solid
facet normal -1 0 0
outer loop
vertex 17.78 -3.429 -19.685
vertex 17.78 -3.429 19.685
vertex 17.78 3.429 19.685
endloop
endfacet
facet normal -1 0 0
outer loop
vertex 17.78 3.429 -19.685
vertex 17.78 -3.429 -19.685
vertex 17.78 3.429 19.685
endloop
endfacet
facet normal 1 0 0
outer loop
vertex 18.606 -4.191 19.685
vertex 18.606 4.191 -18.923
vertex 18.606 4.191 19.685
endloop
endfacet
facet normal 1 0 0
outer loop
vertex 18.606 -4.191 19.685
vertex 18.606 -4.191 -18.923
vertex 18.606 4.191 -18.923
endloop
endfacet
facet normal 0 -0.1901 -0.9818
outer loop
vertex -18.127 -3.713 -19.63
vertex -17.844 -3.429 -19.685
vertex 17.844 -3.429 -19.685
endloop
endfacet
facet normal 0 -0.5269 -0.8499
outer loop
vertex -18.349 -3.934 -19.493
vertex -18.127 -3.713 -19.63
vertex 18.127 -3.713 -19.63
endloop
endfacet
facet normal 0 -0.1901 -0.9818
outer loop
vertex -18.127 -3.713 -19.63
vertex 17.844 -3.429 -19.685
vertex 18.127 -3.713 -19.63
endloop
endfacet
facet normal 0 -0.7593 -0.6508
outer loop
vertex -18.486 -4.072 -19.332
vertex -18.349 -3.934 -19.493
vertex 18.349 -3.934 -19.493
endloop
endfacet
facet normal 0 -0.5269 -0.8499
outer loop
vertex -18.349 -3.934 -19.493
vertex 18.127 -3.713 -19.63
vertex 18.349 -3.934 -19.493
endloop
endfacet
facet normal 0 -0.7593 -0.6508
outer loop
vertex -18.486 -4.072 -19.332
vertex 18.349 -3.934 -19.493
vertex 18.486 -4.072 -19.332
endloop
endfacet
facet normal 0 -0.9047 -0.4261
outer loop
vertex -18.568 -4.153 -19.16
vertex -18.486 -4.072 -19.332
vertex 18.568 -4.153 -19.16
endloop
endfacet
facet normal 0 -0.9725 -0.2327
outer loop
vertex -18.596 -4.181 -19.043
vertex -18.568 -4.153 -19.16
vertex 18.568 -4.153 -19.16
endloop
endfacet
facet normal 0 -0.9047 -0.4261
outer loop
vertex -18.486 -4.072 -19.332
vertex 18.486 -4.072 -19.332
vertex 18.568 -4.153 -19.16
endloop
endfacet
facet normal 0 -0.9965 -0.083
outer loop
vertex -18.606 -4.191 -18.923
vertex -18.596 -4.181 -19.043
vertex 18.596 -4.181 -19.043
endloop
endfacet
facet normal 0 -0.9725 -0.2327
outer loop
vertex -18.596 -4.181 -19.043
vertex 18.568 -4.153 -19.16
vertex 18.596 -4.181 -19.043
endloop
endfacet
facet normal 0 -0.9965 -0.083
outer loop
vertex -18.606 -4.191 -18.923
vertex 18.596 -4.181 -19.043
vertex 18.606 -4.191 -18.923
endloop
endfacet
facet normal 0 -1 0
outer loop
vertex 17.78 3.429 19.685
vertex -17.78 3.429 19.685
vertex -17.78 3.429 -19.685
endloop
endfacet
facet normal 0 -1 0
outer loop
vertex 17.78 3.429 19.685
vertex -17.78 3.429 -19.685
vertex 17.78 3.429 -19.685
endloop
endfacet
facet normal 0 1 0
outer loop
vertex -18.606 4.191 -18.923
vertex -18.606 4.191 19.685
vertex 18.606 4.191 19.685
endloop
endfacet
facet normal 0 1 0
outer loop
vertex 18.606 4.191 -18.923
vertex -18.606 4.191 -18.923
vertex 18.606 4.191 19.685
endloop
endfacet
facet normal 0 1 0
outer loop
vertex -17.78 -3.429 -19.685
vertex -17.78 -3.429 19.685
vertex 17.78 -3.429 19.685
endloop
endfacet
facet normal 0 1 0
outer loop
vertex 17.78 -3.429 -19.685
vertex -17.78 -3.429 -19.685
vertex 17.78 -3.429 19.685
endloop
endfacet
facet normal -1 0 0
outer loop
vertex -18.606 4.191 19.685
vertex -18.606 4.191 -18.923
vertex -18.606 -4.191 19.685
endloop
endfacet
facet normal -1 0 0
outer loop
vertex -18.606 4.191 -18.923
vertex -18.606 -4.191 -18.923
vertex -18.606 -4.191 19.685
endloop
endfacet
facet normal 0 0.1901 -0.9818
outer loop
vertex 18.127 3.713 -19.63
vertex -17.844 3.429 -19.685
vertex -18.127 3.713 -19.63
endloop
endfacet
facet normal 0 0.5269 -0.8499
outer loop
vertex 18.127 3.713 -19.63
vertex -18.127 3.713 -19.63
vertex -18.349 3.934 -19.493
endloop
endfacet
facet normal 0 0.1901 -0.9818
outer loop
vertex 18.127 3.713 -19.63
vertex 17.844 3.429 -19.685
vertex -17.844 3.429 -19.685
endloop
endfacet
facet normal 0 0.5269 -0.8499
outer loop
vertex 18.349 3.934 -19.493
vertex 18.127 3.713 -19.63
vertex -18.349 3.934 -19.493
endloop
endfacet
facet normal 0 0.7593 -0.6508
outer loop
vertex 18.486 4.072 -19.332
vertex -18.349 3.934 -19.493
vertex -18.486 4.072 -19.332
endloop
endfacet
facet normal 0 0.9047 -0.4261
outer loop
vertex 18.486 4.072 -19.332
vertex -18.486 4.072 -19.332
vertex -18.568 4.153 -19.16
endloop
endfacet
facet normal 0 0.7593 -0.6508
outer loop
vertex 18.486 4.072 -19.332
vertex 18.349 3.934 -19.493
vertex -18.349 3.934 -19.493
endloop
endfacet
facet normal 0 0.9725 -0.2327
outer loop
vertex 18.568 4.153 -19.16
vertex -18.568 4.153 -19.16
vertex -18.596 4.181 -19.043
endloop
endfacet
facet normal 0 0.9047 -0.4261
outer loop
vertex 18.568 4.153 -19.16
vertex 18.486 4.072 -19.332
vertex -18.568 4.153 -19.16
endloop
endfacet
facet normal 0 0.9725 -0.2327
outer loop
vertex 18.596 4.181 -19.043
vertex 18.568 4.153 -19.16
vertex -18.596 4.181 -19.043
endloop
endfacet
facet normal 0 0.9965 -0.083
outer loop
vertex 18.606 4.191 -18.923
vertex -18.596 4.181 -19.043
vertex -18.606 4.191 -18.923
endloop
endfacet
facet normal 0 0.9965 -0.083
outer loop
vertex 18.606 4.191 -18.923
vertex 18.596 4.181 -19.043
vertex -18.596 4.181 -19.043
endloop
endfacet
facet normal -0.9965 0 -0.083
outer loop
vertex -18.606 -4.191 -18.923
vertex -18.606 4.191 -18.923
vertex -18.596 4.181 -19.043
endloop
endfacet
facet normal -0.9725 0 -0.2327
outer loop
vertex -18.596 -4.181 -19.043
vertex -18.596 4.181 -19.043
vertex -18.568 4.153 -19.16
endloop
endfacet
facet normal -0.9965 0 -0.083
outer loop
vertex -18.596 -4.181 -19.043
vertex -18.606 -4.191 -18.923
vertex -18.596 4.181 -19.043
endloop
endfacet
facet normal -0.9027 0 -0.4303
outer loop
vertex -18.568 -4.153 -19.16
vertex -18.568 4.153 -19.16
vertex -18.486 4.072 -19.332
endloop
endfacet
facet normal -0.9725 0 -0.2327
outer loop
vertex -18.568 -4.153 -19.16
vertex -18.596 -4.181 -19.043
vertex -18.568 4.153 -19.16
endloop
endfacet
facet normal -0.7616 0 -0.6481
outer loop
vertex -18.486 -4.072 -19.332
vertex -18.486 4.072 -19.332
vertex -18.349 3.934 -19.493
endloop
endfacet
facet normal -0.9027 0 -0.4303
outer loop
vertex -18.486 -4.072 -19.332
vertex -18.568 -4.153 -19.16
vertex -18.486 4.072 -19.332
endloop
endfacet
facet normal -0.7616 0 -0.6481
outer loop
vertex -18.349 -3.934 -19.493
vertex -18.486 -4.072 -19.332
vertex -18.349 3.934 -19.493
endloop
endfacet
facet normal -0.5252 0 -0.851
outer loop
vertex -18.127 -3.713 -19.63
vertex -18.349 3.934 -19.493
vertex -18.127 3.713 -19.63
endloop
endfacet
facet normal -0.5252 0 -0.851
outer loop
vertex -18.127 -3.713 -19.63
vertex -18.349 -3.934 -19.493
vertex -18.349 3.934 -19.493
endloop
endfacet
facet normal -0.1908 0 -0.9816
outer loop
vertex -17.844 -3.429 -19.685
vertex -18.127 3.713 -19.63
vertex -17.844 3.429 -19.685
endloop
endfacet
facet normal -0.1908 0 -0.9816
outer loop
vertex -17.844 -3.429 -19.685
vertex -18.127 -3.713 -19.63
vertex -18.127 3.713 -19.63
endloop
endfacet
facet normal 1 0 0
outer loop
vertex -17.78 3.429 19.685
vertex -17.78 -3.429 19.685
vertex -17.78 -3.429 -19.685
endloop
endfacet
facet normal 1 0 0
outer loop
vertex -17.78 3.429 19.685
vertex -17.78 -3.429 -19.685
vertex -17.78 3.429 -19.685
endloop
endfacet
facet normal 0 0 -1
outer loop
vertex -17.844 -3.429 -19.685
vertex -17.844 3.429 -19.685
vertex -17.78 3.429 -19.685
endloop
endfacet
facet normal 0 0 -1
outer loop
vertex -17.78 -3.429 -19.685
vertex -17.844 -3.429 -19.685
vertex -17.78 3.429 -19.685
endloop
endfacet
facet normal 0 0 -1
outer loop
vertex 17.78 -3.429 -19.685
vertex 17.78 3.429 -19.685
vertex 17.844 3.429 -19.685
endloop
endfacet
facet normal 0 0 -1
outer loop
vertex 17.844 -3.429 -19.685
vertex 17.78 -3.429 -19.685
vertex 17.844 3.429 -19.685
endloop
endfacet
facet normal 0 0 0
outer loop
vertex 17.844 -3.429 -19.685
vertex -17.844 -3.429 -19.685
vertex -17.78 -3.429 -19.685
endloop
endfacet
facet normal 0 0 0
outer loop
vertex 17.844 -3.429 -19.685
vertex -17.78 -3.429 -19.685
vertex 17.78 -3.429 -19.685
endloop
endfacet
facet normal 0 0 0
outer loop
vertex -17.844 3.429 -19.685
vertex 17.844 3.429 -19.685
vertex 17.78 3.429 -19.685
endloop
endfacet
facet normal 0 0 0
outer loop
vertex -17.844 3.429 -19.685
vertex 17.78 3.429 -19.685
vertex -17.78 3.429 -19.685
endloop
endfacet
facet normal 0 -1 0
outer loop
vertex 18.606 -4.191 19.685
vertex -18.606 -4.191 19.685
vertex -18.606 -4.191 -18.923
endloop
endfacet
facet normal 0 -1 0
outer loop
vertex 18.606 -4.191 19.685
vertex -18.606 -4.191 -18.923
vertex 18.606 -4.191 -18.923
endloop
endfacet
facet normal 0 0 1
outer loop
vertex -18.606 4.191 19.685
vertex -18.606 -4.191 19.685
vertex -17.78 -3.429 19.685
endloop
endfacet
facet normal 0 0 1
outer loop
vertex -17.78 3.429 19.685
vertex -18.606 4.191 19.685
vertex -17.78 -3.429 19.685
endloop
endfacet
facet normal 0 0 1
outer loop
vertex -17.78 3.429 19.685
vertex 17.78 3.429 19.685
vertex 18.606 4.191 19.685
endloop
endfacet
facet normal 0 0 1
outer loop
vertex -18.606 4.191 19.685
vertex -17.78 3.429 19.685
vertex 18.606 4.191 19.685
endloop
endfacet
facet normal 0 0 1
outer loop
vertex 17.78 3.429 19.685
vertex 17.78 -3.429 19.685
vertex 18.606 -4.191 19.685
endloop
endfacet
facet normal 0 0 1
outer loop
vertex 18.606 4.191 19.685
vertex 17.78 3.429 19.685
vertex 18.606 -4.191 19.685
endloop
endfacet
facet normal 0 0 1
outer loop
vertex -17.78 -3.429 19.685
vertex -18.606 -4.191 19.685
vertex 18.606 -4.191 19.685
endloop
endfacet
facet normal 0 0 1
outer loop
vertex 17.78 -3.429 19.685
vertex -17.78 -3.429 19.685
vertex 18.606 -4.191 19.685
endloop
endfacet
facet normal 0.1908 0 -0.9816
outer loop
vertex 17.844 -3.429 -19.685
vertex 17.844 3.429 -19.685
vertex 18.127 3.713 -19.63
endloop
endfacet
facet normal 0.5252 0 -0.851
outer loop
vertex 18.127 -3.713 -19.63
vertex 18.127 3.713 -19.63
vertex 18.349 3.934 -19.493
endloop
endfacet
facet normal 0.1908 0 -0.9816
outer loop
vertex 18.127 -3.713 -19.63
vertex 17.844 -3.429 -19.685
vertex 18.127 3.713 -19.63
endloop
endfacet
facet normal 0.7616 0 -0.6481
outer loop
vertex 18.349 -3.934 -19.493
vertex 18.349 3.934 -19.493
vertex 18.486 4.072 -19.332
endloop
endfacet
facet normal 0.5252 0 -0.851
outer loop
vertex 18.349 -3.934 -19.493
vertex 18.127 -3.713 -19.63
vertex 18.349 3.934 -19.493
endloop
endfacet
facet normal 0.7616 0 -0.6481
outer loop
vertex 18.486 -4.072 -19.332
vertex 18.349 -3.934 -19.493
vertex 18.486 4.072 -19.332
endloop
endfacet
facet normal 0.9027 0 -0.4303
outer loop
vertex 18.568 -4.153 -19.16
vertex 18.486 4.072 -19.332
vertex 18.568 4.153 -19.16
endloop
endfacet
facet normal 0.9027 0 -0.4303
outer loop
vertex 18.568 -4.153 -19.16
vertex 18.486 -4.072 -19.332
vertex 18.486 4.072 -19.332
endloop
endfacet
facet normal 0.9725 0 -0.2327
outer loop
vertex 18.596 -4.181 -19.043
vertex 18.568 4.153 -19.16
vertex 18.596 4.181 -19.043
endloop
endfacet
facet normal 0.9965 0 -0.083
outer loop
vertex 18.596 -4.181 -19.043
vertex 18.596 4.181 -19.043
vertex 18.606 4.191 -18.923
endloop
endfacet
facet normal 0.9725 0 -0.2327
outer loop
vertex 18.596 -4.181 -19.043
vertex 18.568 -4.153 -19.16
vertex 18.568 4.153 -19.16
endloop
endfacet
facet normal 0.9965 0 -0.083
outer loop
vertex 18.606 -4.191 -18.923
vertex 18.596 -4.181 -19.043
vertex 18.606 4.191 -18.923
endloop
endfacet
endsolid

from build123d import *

# Parameters (mm, degrees)
F0_W     = 37.211
F0_H     = 39.37
F1_DEPTH = 4.191
F2_W     = 35.56
F2_H     = 6.858
F3_DEPTH = 39.37
F4_R     = 0.76199


# Not quite as in the source:
# - a fillet or chamfer is up to 0.001 mm smaller than in the source, because OpenCascade refuses the exact size


with BuildPart() as f1:
    # F0 (on Front) → F1 (new body, symmetric)
    with BuildSketch(Plane.XZ):
        Rectangle(F0_W, F0_H)
    extrude(amount=F1_DEPTH, both=True)

    # F2 (on face) → F3 (cut)
    with BuildSketch(Plane.XY.offset(19.685)):
        Rectangle(F2_W, F2_H)
    extrude(amount=-F3_DEPTH, mode=Mode.SUBTRACT)

    # F4 (radius 0.762 in the source; OpenCascade refuses exactly that, so slightly less here)
    f4_edges = [f1.edges().sort_by_distance(p)[0] for p in [
        (0, -4.191, -19.685),
        (18.6055, 0, -19.685),
        (0, 4.191, -19.685),
        (-18.6055, 0, -19.685),
    ]]
    fillet(f4_edges, radius=F4_R)


solid = f1.part
